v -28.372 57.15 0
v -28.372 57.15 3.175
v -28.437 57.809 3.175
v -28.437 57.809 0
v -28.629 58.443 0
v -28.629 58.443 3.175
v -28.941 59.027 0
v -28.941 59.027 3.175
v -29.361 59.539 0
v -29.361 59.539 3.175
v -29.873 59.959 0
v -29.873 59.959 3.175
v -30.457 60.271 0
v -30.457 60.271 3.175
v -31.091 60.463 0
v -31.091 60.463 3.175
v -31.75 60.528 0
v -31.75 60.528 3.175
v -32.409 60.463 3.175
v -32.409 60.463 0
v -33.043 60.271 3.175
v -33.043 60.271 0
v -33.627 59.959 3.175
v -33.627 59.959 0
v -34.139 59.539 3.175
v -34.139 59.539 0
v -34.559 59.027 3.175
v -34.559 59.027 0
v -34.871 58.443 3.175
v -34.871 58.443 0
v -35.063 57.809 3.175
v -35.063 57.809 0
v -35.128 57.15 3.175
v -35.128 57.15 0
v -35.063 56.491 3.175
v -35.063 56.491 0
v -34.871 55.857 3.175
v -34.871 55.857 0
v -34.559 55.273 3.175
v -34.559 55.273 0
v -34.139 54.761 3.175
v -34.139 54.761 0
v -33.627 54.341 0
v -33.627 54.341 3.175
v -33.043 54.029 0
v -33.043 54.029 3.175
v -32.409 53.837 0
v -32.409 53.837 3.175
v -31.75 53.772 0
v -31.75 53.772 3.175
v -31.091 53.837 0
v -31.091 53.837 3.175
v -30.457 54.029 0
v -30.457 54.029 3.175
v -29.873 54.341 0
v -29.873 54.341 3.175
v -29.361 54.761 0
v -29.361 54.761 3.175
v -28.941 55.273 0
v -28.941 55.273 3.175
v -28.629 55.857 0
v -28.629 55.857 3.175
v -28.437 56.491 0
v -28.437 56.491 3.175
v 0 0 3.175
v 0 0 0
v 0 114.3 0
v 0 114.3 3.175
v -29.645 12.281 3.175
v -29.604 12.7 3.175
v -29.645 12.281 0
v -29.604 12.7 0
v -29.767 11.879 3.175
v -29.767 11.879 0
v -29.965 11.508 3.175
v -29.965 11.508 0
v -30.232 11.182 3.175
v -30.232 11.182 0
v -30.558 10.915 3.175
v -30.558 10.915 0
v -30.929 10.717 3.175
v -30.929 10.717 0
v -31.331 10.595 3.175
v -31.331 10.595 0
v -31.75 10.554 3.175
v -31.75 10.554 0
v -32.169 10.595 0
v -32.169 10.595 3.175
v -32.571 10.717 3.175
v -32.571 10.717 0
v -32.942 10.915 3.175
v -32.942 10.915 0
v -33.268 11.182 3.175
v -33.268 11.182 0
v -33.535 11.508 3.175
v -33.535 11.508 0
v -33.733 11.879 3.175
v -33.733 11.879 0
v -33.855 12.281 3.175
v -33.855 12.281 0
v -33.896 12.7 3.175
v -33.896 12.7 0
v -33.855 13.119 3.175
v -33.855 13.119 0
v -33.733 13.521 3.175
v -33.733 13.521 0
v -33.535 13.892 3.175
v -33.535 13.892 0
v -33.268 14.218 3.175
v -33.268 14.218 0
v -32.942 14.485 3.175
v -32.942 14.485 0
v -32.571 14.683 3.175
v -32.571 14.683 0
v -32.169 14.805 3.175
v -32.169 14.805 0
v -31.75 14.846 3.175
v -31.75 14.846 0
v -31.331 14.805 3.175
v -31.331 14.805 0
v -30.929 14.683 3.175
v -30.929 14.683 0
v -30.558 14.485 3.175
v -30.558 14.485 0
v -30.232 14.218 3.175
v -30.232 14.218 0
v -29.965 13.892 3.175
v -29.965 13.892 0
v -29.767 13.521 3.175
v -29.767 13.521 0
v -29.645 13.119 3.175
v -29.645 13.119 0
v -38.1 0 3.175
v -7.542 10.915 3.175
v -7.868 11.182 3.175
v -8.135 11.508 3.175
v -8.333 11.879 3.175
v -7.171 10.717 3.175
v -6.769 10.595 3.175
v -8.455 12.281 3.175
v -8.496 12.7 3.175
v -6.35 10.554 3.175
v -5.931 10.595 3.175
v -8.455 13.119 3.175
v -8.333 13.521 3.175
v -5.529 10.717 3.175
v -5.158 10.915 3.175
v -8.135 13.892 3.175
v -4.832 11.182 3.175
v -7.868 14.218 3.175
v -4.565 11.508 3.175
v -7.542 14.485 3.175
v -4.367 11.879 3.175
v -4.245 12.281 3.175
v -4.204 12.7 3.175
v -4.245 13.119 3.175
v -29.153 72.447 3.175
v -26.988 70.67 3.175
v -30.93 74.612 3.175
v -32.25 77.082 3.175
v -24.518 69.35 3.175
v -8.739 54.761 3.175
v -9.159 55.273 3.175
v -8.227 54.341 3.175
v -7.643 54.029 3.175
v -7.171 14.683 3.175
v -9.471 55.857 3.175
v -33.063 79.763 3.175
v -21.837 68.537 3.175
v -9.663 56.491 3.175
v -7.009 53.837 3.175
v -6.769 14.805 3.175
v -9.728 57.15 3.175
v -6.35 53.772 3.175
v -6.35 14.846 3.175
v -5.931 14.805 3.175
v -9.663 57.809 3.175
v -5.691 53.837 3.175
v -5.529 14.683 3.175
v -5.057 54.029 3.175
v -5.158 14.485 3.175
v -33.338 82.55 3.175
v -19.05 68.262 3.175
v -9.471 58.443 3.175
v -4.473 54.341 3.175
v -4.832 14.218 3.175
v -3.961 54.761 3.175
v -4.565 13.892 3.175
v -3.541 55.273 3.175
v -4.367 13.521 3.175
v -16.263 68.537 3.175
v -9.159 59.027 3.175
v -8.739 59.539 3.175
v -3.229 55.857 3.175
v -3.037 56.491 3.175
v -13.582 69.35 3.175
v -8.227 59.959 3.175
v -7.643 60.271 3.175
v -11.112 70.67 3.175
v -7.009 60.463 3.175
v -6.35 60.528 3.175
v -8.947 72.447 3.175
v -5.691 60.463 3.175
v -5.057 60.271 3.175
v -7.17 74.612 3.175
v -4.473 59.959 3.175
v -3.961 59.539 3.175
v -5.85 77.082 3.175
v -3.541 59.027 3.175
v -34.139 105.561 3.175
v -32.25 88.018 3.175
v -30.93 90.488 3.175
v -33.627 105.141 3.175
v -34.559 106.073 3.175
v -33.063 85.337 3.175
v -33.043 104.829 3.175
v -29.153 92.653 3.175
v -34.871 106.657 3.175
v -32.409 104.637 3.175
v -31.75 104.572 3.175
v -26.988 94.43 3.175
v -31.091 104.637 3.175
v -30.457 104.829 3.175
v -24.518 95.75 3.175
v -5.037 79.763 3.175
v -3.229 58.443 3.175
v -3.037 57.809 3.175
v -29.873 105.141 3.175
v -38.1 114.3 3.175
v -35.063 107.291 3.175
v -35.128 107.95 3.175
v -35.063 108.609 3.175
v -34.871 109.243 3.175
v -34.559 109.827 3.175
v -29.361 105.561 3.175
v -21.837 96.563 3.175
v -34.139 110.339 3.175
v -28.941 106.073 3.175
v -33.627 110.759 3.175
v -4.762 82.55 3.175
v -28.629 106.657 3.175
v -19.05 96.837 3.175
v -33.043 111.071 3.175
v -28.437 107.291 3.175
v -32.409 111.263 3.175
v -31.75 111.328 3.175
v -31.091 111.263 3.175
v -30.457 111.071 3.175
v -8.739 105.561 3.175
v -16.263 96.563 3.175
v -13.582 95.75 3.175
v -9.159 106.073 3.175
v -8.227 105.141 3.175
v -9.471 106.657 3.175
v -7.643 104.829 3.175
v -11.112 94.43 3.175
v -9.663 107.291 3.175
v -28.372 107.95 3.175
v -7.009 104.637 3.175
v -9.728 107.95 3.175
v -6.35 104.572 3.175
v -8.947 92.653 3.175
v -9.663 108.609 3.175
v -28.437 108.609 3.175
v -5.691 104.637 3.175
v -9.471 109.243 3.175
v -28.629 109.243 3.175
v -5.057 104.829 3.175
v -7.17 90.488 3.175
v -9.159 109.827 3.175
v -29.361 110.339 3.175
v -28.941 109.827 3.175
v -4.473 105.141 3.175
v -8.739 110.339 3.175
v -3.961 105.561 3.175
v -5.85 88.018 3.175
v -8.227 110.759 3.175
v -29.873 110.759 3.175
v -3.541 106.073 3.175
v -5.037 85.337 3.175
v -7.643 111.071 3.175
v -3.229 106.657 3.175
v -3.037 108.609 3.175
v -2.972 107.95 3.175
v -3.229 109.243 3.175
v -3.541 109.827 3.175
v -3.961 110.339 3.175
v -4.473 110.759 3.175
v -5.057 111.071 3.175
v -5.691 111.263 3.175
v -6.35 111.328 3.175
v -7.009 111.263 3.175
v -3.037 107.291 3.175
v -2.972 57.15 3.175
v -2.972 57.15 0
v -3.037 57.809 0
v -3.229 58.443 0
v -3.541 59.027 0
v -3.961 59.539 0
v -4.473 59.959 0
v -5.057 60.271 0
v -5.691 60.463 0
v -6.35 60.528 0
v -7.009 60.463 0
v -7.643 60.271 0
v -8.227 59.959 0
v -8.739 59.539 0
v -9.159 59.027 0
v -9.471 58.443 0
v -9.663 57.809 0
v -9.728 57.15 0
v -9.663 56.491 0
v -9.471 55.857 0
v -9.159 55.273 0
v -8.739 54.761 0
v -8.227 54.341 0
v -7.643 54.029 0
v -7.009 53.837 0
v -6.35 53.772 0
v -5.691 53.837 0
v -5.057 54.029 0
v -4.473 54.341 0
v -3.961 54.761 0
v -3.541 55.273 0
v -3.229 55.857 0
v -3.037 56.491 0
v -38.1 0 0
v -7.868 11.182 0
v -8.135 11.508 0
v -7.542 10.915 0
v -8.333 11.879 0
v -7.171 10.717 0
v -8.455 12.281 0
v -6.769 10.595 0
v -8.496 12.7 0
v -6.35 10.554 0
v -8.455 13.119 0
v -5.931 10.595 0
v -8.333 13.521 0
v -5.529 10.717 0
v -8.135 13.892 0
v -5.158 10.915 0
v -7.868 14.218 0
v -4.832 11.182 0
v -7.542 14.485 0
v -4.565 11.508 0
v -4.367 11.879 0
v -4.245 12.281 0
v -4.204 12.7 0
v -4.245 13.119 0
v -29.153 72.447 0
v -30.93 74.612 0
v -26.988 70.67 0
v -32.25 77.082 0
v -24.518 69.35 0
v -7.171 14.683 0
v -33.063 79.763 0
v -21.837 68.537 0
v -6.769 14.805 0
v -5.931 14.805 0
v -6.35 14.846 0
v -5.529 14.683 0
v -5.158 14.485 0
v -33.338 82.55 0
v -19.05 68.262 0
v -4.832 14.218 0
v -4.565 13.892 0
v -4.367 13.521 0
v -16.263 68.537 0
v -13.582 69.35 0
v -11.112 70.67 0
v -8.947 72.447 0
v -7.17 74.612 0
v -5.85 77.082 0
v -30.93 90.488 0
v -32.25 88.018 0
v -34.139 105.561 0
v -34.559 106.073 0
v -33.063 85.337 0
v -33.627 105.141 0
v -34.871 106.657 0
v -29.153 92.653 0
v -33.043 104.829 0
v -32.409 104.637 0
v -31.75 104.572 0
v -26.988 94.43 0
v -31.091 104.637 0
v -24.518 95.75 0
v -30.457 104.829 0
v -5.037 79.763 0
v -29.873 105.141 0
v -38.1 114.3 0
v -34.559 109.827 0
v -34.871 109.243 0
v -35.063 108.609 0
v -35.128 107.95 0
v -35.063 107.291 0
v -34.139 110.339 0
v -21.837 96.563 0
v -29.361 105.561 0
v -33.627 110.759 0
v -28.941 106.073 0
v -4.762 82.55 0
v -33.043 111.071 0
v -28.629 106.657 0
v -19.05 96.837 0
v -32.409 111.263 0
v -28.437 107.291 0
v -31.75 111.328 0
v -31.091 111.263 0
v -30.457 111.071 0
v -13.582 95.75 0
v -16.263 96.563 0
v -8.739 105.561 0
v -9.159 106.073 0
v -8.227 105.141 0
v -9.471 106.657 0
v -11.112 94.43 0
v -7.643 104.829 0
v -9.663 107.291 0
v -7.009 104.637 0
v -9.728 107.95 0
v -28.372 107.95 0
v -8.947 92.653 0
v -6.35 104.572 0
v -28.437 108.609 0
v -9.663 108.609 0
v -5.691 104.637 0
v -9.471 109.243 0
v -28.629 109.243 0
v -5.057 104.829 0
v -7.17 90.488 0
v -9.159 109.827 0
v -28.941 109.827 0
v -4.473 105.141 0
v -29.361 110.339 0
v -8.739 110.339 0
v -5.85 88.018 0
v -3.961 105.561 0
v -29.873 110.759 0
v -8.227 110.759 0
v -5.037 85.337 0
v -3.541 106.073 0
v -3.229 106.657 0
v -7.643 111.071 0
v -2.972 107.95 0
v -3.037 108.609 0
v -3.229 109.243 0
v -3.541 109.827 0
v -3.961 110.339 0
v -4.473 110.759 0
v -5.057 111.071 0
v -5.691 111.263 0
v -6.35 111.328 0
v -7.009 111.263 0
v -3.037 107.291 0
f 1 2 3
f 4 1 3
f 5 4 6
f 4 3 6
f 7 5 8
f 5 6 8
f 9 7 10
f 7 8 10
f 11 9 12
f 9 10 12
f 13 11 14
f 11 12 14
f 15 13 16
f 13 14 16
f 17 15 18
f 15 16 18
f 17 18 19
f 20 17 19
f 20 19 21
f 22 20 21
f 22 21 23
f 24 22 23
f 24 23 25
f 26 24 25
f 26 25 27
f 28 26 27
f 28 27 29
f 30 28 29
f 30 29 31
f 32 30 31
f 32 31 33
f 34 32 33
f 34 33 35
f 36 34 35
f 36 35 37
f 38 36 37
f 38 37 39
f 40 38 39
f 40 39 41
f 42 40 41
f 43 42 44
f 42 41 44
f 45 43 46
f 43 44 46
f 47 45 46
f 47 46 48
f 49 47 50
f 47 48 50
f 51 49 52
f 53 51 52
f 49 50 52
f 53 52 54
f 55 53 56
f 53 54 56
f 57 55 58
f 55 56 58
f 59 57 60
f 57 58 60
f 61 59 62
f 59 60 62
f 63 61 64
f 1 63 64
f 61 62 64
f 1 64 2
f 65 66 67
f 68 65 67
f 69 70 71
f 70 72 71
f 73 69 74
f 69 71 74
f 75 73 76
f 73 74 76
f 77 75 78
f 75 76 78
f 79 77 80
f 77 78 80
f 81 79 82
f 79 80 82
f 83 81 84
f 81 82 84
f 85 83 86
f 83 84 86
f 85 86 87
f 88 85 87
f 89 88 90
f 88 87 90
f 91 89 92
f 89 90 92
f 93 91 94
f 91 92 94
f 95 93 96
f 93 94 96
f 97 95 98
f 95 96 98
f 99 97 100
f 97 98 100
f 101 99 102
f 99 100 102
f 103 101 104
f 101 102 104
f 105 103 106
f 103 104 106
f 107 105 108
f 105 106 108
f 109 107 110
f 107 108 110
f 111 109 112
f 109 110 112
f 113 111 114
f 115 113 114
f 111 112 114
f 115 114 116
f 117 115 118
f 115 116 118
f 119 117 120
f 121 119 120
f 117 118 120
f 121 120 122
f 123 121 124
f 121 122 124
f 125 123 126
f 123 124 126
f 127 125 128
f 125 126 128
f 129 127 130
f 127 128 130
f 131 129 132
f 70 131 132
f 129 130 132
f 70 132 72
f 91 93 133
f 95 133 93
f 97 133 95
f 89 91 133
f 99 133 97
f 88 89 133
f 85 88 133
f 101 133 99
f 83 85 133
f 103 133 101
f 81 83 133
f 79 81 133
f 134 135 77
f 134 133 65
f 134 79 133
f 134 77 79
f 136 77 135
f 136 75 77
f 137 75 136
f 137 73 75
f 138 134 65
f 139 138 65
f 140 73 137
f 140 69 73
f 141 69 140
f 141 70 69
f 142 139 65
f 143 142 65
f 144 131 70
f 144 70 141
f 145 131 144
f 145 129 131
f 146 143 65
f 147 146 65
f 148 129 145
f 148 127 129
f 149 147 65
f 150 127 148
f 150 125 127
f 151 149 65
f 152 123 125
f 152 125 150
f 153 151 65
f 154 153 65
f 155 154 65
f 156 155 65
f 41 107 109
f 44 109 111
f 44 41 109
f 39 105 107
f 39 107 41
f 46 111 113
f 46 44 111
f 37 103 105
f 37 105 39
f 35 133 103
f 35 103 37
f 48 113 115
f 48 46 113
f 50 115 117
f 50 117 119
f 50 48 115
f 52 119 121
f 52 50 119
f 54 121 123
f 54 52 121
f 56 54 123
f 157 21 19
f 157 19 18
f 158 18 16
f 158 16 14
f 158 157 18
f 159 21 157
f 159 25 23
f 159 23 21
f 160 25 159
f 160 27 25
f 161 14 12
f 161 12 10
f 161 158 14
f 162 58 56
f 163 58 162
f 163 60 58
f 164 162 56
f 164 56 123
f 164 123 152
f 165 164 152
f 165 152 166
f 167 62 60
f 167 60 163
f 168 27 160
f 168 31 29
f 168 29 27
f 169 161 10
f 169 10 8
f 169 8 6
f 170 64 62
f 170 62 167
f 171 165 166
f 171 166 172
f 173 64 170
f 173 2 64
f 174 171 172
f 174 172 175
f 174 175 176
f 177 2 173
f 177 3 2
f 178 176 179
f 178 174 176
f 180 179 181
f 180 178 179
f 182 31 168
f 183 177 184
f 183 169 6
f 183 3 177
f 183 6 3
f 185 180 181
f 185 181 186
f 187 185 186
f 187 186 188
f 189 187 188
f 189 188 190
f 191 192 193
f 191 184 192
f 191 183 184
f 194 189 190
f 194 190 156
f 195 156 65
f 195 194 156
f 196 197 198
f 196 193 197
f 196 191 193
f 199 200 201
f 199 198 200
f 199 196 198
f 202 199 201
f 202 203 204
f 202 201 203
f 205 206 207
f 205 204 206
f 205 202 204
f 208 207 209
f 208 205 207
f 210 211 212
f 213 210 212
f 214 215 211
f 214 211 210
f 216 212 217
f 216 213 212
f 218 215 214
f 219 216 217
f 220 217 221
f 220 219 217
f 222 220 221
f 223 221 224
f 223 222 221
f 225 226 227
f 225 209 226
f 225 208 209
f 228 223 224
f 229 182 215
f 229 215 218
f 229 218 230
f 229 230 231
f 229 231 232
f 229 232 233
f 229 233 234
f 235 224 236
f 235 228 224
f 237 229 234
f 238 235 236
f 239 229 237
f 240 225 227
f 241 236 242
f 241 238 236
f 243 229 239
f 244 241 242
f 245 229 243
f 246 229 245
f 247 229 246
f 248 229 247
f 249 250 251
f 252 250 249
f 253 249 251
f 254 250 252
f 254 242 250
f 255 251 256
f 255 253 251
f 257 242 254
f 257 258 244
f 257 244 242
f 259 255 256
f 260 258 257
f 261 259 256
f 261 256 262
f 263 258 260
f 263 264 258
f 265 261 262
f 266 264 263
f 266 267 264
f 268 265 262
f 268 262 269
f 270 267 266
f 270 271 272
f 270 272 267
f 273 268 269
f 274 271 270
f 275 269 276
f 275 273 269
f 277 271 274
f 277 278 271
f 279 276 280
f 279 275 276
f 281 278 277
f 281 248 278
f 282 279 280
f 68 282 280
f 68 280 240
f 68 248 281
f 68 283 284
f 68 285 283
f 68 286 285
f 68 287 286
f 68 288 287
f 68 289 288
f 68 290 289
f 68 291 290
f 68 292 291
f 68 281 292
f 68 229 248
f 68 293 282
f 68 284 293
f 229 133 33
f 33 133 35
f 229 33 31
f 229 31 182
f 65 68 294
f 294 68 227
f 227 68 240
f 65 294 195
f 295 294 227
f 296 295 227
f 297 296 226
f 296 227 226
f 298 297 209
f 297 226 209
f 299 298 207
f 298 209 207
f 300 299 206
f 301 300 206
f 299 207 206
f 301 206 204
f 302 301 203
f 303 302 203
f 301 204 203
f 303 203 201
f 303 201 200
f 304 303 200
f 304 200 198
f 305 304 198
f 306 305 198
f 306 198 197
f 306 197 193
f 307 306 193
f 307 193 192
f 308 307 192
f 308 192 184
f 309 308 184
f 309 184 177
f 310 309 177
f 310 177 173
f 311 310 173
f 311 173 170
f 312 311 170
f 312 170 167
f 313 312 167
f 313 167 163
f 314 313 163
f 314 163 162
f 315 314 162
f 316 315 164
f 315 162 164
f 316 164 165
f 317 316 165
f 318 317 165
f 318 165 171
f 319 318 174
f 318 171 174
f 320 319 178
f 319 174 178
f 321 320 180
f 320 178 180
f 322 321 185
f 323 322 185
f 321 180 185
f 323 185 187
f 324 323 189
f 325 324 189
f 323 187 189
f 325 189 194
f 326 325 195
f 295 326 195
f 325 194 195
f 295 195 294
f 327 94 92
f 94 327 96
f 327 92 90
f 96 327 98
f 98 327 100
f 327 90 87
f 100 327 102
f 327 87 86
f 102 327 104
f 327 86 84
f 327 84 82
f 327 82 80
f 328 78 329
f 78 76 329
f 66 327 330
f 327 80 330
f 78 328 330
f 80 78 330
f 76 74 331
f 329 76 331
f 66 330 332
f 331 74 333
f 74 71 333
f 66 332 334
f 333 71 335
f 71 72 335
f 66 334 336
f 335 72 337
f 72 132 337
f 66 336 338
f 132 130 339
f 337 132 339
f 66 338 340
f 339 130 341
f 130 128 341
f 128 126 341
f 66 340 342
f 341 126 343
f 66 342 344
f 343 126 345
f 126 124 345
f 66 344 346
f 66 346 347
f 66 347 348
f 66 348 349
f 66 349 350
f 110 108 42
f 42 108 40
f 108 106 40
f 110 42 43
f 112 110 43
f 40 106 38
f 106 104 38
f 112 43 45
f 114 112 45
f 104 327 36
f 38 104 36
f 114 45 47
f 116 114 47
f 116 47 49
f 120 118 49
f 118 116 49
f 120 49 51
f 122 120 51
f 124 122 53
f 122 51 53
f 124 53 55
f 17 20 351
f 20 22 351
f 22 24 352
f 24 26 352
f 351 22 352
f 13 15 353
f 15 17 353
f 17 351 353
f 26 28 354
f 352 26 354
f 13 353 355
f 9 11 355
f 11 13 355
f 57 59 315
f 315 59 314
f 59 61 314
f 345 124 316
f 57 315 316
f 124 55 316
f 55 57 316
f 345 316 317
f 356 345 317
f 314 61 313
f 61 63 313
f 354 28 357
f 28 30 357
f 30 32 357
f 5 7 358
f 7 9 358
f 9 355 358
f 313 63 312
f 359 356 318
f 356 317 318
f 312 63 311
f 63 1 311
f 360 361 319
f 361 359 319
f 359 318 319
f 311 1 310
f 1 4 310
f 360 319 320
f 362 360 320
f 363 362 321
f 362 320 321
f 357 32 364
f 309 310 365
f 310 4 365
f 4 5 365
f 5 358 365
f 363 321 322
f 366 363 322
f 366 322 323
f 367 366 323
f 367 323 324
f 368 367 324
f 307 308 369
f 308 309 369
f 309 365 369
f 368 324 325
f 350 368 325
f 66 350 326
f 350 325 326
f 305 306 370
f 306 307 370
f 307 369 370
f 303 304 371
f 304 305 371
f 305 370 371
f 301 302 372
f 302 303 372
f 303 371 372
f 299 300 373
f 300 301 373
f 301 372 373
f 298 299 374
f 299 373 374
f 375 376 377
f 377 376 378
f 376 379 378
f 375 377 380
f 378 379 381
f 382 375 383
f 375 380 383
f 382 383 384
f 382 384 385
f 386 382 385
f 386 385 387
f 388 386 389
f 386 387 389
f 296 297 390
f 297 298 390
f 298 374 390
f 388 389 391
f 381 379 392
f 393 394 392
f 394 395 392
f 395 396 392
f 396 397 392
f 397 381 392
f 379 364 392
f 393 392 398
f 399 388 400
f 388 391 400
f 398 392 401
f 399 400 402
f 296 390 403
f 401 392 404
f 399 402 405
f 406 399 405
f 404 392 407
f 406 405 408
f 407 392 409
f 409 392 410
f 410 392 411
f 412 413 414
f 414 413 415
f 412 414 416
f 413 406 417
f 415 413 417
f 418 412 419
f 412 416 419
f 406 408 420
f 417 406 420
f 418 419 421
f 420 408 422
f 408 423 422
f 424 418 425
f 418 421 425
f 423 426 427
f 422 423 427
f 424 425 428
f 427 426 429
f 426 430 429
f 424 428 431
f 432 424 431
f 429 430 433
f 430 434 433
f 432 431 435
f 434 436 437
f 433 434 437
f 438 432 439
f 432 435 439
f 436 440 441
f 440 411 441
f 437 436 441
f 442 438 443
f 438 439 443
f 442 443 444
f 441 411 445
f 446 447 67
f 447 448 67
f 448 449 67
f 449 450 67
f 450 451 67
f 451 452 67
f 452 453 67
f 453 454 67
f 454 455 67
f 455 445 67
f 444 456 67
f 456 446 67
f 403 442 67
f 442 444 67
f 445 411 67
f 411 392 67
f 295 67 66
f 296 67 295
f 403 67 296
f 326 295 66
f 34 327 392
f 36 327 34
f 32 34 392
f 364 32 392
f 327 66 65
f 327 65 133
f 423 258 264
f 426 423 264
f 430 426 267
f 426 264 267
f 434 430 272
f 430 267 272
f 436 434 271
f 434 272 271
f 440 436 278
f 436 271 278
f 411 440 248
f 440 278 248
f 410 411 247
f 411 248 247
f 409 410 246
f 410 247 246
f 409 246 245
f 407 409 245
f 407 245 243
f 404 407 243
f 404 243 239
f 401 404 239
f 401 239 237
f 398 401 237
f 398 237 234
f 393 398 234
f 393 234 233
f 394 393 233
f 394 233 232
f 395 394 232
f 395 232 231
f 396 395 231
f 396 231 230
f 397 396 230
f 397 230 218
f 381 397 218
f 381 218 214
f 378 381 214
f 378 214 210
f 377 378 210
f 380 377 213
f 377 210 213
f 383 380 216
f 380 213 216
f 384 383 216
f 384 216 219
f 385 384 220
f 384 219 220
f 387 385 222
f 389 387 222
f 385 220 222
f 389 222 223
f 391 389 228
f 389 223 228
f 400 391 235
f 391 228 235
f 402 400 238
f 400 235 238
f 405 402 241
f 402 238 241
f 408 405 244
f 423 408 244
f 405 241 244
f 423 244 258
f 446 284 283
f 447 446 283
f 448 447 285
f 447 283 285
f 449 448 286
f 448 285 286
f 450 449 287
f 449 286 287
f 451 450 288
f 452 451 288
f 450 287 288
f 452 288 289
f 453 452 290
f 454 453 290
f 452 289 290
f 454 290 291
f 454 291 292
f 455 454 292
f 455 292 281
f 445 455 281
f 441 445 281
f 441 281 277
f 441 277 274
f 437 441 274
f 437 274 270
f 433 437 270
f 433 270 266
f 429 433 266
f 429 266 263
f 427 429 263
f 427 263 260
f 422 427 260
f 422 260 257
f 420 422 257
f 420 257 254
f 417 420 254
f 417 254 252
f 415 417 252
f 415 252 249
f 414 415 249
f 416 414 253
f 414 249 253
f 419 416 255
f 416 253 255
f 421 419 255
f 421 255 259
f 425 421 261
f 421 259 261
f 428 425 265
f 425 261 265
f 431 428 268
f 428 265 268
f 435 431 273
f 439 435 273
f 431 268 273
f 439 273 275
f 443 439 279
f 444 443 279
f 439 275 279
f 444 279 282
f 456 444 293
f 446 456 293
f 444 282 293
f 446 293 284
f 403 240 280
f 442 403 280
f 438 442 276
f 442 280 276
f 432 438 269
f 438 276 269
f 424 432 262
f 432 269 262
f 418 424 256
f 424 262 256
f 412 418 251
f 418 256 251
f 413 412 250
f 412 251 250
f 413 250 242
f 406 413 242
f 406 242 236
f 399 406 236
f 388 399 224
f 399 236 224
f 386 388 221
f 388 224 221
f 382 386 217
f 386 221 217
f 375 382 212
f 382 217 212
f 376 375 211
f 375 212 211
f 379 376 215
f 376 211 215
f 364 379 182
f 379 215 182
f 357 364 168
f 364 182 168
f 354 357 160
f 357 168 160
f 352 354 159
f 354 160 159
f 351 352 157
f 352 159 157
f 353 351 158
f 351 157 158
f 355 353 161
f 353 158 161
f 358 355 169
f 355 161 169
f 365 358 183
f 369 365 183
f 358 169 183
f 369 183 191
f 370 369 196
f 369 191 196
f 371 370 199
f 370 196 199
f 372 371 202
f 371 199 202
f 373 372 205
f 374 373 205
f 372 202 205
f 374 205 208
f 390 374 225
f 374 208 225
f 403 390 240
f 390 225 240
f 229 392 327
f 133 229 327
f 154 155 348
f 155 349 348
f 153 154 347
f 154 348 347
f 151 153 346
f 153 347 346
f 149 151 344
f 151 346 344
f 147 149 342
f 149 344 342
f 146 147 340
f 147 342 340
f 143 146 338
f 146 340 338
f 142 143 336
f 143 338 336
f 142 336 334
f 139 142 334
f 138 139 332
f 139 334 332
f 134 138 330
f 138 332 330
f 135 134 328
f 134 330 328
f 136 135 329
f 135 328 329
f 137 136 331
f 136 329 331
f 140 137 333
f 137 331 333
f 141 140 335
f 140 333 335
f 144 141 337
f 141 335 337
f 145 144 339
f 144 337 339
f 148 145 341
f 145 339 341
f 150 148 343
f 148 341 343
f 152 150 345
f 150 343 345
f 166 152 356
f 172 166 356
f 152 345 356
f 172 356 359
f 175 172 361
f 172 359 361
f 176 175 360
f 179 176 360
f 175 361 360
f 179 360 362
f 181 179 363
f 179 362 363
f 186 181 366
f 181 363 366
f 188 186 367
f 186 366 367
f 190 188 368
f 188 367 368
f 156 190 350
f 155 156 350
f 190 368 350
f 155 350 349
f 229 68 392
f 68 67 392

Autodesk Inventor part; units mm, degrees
ref_plane "YZ Plane" through (0, 0, 0) normal (1, 0, 0) x (0, 1, 0)
ref_plane "XZ Plane" through (0, 0, 0) normal (0, 1, 0) x (-1, 0, 0)
ref_plane "XY Plane" through (0, 0, 0) normal (0, 0, 1) x (1, 0, 0)
sketch "Sketch1" plane through (0, 0, 0) normal (0, 0, 1) x (1, 0, 0)
  line L0 (0, 0) -> (-38.1, 0)
  line L1 (0, 0) -> (0, 114.3)
  line L2 (0, 114.3) -> (-38.1, 114.3)
  line L3 (-38.1, 114.3) -> (-38.1, 0)
  line L4 (-38.1, 114.3) -> (-31.75, 114.3)
  line L5 (-31.75, 114.3) -> (-31.75, 12.7)
  line L6 (0, 114.3) -> (-6.35, 114.3)
  line L7 (-6.35, 114.3) -> (-6.35, 12.7)
  circle A0 centre (-31.75, 12.7) radius 2.1463
  circle A1 centre (-6.35, 12.7) radius 2.1463
  dimension "d0" = 38.1
  dimension "d1" = 114.3
  dimension "d2" = 6.35
  dimension "d3" = 101.6
  dimension "d4" = 6.35
  dimension "d5" = 4.2926
  dimension "d6" = 4.2926
  dimension "d7" = 101.6
extrude "Plate1" add sketch "Sketch1" along normal blind 3.175
sketch "Sketch3" plane through (0, 0, 3.175) normal (0, 0, 1) x (1, 0, 0)
  line L0 (0, 114.3) -> (0, 0) projected
  line L1 (-38.1, 114.3) -> (0, 114.3) projected
  line L2 (-38.1, 0) -> (-38.1, 114.3) projected
  line L3 (-38.1, 114.3) -> (-38.1, 107.95)
  line L4 (-38.1, 107.95) -> (-31.75, 107.95)
  circle A0 centre (-31.75, 107.95) radius 3.3782
  line L5 (0, 114.3) -> (0, 107.95)
  line L6 (0, 107.95) -> (-6.35, 107.95)
  circle A1 centre (-6.35, 107.95) radius 3.3782
  line L7 (-38.1, 107.95) -> (-38.1, 57.15)
  line L8 (-38.1, 57.15) -> (-31.75, 57.15)
  line L9 (0, 57.15) -> (-6.35, 57.15)
  circle A2 centre (-31.75, 57.15) radius 3.3782
  circle A3 centre (-6.35, 57.15) radius 3.3782
  line L10 (-38.1, 114.3) -> (-38.1, 82.55)
  line L11 (-38.1, 82.55) -> (-19.05, 82.55)
  circle A4 centre (-19.05, 82.55) radius 14.2875
  dimension "d19" = 6.35
  dimension "d20" = 6.35
  dimension "d21" = 6.7564
  dimension "d22" = 6.35
  dimension "d23" = 6.35
  dimension "d24" = 6.7564
  dimension "d25" = 50.8
  dimension "d26" = 6.35
  dimension "d27" = 6.35
  dimension "d28" = 57.15
  dimension "d29" = 6.7564
  dimension "d30" = 6.7564
  dimension "d31" = 31.75
  dimension "d32" = 28.575
extrude "Cut1" cut sketch "Sketch3" against normal blind 3.175
equation "\"d33\" = Thickness"
equation "\"BendRadius\" = Thickness"
equation "\"BendReliefWidth\" = Thickness"
equation "\"BendReliefDepth\" = 0.5 * Thickness"
equation "\"CornerReliefSize\" = 4 * Thickness"
equation "\"MinimumRemnant\" = 2 * Thickness"
equation "\"TransitionRadius\" = BendRadius"
equation "\"JacobiRadiusSize\" = BendRadius"
equation "\"GapSize\" = Thickness"
equation "\"d8\" = BendRadius"
equation "\"Thickness\" = 3.175"
properties part number "upper pulley mount"
